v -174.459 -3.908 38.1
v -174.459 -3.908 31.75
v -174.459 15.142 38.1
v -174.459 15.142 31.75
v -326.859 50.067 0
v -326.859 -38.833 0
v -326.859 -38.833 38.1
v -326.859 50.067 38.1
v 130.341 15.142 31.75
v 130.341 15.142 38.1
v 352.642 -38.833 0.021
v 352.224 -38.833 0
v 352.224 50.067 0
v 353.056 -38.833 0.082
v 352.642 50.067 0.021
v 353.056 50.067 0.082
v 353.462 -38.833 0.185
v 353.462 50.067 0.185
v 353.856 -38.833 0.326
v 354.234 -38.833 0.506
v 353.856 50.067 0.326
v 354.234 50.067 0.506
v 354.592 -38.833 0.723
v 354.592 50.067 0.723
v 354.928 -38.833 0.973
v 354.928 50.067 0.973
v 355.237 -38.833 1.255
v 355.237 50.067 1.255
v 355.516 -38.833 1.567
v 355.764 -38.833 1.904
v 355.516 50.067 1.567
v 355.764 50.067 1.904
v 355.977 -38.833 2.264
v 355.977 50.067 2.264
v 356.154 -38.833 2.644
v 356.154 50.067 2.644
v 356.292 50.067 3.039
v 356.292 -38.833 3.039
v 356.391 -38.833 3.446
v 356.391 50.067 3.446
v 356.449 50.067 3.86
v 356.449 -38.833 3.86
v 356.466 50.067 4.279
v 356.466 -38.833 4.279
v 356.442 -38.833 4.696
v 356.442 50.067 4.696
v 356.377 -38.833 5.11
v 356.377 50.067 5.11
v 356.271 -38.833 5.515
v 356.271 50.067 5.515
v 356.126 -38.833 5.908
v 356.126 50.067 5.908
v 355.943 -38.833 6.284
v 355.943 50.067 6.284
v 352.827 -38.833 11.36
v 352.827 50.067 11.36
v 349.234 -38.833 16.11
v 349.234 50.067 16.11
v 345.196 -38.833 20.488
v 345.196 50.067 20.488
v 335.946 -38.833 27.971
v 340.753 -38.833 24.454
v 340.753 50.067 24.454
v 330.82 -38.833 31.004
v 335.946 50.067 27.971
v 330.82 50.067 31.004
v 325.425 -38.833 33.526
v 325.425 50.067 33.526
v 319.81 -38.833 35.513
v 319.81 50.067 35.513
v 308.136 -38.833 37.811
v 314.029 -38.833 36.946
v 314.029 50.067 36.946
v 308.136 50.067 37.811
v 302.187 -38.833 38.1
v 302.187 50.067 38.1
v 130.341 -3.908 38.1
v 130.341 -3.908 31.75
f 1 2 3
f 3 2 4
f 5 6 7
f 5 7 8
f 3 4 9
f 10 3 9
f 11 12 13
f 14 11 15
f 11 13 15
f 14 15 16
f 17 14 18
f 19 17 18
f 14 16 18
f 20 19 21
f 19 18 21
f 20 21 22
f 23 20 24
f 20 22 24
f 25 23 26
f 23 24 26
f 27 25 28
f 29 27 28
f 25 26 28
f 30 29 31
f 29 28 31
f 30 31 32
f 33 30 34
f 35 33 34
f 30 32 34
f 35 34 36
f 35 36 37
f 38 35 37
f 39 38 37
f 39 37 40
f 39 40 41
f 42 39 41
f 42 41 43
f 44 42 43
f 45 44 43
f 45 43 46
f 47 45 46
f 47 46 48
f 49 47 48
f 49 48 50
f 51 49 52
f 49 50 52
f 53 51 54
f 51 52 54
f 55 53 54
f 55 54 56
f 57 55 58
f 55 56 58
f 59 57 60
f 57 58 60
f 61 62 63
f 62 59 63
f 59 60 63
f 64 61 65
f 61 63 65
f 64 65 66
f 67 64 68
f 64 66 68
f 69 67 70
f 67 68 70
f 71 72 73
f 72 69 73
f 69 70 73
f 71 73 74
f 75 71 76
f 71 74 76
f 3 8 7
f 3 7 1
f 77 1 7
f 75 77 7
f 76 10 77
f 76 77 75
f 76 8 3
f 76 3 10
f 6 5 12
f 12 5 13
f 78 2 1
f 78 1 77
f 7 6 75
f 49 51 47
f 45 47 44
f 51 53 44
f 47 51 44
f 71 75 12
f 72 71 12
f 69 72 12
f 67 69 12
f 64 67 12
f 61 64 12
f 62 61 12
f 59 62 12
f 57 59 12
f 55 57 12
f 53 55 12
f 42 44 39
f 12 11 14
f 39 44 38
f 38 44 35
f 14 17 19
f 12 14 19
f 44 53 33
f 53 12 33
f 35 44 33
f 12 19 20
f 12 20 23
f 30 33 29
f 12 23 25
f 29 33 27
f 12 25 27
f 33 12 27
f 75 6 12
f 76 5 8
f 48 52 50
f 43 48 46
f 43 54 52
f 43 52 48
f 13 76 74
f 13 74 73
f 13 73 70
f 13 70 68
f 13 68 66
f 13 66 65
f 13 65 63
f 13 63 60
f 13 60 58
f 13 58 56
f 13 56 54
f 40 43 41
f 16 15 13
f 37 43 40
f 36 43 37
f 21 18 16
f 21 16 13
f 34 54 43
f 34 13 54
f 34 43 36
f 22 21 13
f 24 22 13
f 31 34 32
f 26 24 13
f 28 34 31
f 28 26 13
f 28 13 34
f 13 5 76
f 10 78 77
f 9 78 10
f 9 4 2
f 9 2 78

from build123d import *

# Parameters (mm, degrees)
F0_W        = 685.8
F0_H        = 88.9
F0_W_2      = 304.8
F0_H_2      = 19.05
F1_DEPTH    = 38.1
F2_T1_DEPTH = 372.6715659515
F3_R        = 4.2426380505
F4_DEPTH    = 31.75


# Not quite as in the source:
# - a fillet or chamfer that OpenCascade refuses, or shapes differently, is made with other operations: its cross-section is extruded or revolved along the edge and cut away or added


with BuildPart() as f1:
    # F0 (on Top) → F1 (new body)
    with BuildSketch(Plane.XY):
        with Locations((16.0413767457, 5.6168386396)):
            Rectangle(F0_W, F0_H)
        with Locations((-22.0586232543, 5.6168386396)):
            Rectangle(F0_W_2, F0_H_2, mode=Mode.SUBTRACT)
    extrude(amount=F1_DEPTH)

    # F2: fillet of radius 61.3210244843 on 1 edges, made by hand

    # F2_s2 → F2_t1 (cut)
    with BuildSketch(Plane.XZ.offset(-191.9526216153)):
        with BuildLine():
            ThreePointArc((358.9413767457, 0), (336.3654999799, 27.6916706651), (302.1870635554, 38.1))
            Line((302.1870635554, 38.1), (358.9413767457, 38.1))
            Line((358.9413767457, 38.1), (358.9413767457, 0))
        make_face()
    extrude(amount=F2_T1_DEPTH, mode=Mode.SUBTRACT)

    # F3
    f3_edges = [f1.edges().sort_by_distance(p)[0] for p in [
        (358.941377, 5.616839, 0),
    ]]
    fillet(f3_edges, radius=F3_R)

    # F0 (on Top) → F4 (join)
    with BuildSketch(Plane.XY):
        with Locations((-22.0586232543, 5.6168386396)):
            Rectangle(F0_W_2, F0_H_2)
    extrude(amount=F4_DEPTH)


solid = f1.part
